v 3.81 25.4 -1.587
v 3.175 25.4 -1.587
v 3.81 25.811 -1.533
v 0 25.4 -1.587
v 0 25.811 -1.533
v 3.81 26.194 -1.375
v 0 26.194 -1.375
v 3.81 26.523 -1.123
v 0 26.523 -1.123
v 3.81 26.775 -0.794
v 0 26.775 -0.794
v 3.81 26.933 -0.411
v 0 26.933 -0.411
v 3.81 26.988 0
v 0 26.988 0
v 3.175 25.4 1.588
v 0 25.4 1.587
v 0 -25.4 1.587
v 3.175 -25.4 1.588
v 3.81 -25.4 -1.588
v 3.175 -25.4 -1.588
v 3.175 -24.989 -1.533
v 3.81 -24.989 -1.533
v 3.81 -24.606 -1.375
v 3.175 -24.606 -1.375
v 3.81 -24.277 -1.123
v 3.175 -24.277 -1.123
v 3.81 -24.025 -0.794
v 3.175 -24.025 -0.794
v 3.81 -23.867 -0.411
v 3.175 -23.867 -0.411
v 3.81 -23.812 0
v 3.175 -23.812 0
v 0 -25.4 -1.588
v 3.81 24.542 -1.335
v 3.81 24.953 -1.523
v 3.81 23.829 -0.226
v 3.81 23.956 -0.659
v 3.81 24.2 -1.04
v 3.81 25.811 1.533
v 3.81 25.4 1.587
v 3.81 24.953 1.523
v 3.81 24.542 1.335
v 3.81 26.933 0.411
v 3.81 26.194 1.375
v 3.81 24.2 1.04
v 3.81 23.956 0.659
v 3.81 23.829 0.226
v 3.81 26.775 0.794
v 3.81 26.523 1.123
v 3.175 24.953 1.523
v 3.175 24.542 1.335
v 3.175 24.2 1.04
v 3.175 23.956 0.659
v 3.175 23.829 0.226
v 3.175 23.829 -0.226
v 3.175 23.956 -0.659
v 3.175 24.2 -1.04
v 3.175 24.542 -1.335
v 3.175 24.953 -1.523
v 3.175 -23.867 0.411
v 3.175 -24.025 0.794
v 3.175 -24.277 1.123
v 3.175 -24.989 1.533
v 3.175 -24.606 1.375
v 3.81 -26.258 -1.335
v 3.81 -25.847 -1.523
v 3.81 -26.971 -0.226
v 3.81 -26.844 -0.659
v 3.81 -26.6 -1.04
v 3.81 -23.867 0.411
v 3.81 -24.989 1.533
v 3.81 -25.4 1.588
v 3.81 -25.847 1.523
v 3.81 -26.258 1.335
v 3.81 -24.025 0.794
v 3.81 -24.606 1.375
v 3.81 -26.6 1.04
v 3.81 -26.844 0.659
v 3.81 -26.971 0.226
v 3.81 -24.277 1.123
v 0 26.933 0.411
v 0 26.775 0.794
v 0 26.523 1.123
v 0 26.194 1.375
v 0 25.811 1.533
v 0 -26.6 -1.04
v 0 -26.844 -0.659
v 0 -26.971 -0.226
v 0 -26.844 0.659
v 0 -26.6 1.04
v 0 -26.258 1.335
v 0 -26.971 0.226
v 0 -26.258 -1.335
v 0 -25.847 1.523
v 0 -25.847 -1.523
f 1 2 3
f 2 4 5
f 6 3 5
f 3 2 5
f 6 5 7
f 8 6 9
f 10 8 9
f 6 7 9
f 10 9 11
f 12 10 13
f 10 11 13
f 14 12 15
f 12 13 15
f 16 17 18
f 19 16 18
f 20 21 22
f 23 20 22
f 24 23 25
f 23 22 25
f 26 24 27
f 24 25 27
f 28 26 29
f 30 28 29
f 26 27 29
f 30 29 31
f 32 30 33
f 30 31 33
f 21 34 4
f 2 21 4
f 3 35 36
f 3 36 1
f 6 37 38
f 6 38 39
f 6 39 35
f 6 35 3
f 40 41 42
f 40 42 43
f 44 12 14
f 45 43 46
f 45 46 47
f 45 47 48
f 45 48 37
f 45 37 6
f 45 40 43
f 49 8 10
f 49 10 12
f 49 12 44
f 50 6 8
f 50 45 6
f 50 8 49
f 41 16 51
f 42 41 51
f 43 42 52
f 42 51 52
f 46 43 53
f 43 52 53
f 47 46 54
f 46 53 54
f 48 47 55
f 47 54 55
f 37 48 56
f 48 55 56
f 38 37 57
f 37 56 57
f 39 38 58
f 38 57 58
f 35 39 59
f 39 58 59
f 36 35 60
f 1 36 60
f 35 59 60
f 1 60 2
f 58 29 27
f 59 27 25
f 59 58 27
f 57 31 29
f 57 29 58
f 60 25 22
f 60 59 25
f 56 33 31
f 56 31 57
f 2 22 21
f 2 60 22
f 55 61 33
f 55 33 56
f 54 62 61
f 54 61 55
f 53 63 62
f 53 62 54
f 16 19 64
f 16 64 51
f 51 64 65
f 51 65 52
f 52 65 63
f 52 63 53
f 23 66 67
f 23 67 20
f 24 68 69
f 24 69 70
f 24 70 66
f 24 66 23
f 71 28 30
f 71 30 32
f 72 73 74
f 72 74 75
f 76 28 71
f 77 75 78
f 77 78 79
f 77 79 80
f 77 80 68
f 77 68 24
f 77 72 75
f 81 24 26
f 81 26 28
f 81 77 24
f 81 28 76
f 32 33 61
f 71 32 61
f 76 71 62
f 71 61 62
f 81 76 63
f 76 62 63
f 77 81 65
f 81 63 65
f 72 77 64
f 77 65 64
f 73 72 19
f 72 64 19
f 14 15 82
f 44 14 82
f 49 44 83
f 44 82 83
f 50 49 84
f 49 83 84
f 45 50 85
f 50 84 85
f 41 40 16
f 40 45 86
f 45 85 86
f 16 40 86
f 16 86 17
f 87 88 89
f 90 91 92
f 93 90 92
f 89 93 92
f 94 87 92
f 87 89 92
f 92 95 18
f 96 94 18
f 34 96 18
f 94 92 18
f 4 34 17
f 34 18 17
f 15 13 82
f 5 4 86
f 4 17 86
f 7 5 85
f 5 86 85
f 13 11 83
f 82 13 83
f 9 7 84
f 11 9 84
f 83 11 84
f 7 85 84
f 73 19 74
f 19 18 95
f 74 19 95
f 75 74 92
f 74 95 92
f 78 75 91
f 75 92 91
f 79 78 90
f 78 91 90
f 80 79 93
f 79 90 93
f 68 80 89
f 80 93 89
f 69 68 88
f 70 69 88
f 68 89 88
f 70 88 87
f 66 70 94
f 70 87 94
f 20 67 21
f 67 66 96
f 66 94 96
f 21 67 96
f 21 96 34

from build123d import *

# Parameters (mm, degrees)
F1_DEPTH = 3.175
F2_DEPTH = 3.81


with BuildPart() as f1:
    # F0 (on Right) → F1 (new body)
    with BuildSketch(Plane.YZ):
        with BuildLine():
            ThreePointArc((25.4, -1.5875), (23.8125, 0), (25.4, 1.5875))
            Line((25.4, 1.5875), (-25.4, 1.5875))
            ThreePointArc((-25.4, 1.5875), (-24.277468, 1.122532), (-23.8125, 0))
            ThreePointArc((-23.8125, 0), (-24.277468, -1.122532), (-25.4, -1.5875))
            Line((-25.4, -1.5875), (25.4, -1.5875))
        make_face()
    extrude(amount=F1_DEPTH)

    # F0 (on Right) → F2 (join)
    with BuildSketch(Plane.YZ):
        with BuildLine():
            ThreePointArc((-23.8125, 0), (-24.277468, 1.122532), (-25.4, 1.5875))
            Line((-25.4, 1.5875), (-25.4, -1.5875))
            ThreePointArc((-25.4, -1.5875), (-24.277468, -1.122532), (-23.8125, 0))
        make_face()
        with BuildLine():
            Line((-25.4, -1.5875), (-25.4, 1.5875))
            ThreePointArc((-25.4, 1.5875), (-26.9875, 0), (-25.4, -1.5875))
        make_face()
        with BuildLine():
            ThreePointArc((26.9875, 0), (26.522532, 1.122532), (25.4, 1.5875))
            Line((25.4, 1.5875), (25.4, -1.5875))
            ThreePointArc((25.4, -1.5875), (26.522532, -1.122532), (26.9875, 0))
        make_face()
        with BuildLine():
            Line((25.4, -1.5875), (25.4, 1.5875))
            ThreePointArc((25.4, 1.5875), (23.8125, 0), (25.4, -1.5875))
        make_face()
    extrude(amount=F2_DEPTH)


solid = f1.part
